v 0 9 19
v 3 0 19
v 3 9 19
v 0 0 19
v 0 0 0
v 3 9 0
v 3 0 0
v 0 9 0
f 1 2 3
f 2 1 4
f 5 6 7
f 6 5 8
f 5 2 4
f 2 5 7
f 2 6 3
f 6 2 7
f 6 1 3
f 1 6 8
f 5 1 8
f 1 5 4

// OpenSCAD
// Generated by SolidPython 1.0.1 on 2020-07-29 00:46:54


cube(size = [3, 9, 19]);
/***********************************************
*********      SolidPython code:      **********
************************************************
 
# import packages: SolidPython
from solid import *
from solid.utils import *
from itertools import chain, combinations, permutations


class Resize:

    def __init__(self, scad_file):
        self.scad_file = scad_file
        #self.scad_file = import_scad(scad_file)
        # cone/cylinder param:
        self.r1 = 0
        self.r2 = 0
        self.h = 0
        # rectangular prism param:
        self.w = 0
        self.l = 0
        # ellipse param:
        self.r = 0

    # import OpenScad code (file name corresponds to shape)


    # classify shape + parameters
    def assign(self, param1, param2, param3):
        if self.scad_file == 'cone.scad':
            self.r1 = param1
            self.r2 = param2
            self.h = param3
        elif self.scad_file == 'cylinder.scad':
            self.r1 = param1
            self.r2 = param2
            self.h = param3
        elif self.scad_file == 'rectangularPrism.scad':
            self.h = param1
            self.l = param2
            self.w = param3
        else:
            self.r = param1
            self.h = param2

    # resize parameters
    def iterate(self):
        x = range(3, 20, 2)
        i = 1
        if self.scad_file == 'cone.scad':
            tempList = list(permutations(x, 2))
            for temp in tempList:
                param1 = temp[0]
                param2 = temp[1]
                filepath = 'produced_scad_files/' + 'cone' + str(param1) + '_' + str(param2) + '_' + '.scad'
                scad_render_to_file(cylinder(h=param1, r1=param2, r2=0), filepath)

        elif self.scad_file == 'cylinder.scad':
            tempList = list(permutations(x, 3))
            for temp in tempList:
                param1 = temp[0]
                param2 = temp[1]
                filepath = 'produced_scad_files/' + 'cylinder' + str(param1) + '_' + str(param2) + '_' + '.scad'
                scad_render_to_file(cylinder(h=param1, r1=param2, r2=param2), filepath)

        elif self.scad_file == 'rectangularPrism.scad':
            tempList = list(permutations(x, 3))
            for temp in tempList:
                param1 = temp[0]
                param2 = temp[1]
                param3 = temp[2]
                filepath = 'produced_scad_files/' + 'rectangularPrism' + str(param1) + '_' + str(param2) + '_' + str(
                    param3) + '.scad'
                scad_render_to_file(cube(size=(param1, param2, param3)), filepath)

        elif self.scad_file == 'ellipse.scad':
            tempList = list(permutations(x, 4))
            for temp in tempList:
                param1 = temp[0]
                param2 = temp[1]
                param3 = temp[2]
                param4 = temp[3]
                filepath = 'produced_scad_files/' + 'ellipse' + str(param1) + '_' + str(param2) + '_' + str(param3) + '_' + str(param4) + '.scad'
                scad_render_to_file(scale([param1, param2, param3])(sphere(r=param4)), filepath)

    def render_to_scadfile(self):
        scad_render_to_file(scad, 'example.scad') 
 
************************************************/
